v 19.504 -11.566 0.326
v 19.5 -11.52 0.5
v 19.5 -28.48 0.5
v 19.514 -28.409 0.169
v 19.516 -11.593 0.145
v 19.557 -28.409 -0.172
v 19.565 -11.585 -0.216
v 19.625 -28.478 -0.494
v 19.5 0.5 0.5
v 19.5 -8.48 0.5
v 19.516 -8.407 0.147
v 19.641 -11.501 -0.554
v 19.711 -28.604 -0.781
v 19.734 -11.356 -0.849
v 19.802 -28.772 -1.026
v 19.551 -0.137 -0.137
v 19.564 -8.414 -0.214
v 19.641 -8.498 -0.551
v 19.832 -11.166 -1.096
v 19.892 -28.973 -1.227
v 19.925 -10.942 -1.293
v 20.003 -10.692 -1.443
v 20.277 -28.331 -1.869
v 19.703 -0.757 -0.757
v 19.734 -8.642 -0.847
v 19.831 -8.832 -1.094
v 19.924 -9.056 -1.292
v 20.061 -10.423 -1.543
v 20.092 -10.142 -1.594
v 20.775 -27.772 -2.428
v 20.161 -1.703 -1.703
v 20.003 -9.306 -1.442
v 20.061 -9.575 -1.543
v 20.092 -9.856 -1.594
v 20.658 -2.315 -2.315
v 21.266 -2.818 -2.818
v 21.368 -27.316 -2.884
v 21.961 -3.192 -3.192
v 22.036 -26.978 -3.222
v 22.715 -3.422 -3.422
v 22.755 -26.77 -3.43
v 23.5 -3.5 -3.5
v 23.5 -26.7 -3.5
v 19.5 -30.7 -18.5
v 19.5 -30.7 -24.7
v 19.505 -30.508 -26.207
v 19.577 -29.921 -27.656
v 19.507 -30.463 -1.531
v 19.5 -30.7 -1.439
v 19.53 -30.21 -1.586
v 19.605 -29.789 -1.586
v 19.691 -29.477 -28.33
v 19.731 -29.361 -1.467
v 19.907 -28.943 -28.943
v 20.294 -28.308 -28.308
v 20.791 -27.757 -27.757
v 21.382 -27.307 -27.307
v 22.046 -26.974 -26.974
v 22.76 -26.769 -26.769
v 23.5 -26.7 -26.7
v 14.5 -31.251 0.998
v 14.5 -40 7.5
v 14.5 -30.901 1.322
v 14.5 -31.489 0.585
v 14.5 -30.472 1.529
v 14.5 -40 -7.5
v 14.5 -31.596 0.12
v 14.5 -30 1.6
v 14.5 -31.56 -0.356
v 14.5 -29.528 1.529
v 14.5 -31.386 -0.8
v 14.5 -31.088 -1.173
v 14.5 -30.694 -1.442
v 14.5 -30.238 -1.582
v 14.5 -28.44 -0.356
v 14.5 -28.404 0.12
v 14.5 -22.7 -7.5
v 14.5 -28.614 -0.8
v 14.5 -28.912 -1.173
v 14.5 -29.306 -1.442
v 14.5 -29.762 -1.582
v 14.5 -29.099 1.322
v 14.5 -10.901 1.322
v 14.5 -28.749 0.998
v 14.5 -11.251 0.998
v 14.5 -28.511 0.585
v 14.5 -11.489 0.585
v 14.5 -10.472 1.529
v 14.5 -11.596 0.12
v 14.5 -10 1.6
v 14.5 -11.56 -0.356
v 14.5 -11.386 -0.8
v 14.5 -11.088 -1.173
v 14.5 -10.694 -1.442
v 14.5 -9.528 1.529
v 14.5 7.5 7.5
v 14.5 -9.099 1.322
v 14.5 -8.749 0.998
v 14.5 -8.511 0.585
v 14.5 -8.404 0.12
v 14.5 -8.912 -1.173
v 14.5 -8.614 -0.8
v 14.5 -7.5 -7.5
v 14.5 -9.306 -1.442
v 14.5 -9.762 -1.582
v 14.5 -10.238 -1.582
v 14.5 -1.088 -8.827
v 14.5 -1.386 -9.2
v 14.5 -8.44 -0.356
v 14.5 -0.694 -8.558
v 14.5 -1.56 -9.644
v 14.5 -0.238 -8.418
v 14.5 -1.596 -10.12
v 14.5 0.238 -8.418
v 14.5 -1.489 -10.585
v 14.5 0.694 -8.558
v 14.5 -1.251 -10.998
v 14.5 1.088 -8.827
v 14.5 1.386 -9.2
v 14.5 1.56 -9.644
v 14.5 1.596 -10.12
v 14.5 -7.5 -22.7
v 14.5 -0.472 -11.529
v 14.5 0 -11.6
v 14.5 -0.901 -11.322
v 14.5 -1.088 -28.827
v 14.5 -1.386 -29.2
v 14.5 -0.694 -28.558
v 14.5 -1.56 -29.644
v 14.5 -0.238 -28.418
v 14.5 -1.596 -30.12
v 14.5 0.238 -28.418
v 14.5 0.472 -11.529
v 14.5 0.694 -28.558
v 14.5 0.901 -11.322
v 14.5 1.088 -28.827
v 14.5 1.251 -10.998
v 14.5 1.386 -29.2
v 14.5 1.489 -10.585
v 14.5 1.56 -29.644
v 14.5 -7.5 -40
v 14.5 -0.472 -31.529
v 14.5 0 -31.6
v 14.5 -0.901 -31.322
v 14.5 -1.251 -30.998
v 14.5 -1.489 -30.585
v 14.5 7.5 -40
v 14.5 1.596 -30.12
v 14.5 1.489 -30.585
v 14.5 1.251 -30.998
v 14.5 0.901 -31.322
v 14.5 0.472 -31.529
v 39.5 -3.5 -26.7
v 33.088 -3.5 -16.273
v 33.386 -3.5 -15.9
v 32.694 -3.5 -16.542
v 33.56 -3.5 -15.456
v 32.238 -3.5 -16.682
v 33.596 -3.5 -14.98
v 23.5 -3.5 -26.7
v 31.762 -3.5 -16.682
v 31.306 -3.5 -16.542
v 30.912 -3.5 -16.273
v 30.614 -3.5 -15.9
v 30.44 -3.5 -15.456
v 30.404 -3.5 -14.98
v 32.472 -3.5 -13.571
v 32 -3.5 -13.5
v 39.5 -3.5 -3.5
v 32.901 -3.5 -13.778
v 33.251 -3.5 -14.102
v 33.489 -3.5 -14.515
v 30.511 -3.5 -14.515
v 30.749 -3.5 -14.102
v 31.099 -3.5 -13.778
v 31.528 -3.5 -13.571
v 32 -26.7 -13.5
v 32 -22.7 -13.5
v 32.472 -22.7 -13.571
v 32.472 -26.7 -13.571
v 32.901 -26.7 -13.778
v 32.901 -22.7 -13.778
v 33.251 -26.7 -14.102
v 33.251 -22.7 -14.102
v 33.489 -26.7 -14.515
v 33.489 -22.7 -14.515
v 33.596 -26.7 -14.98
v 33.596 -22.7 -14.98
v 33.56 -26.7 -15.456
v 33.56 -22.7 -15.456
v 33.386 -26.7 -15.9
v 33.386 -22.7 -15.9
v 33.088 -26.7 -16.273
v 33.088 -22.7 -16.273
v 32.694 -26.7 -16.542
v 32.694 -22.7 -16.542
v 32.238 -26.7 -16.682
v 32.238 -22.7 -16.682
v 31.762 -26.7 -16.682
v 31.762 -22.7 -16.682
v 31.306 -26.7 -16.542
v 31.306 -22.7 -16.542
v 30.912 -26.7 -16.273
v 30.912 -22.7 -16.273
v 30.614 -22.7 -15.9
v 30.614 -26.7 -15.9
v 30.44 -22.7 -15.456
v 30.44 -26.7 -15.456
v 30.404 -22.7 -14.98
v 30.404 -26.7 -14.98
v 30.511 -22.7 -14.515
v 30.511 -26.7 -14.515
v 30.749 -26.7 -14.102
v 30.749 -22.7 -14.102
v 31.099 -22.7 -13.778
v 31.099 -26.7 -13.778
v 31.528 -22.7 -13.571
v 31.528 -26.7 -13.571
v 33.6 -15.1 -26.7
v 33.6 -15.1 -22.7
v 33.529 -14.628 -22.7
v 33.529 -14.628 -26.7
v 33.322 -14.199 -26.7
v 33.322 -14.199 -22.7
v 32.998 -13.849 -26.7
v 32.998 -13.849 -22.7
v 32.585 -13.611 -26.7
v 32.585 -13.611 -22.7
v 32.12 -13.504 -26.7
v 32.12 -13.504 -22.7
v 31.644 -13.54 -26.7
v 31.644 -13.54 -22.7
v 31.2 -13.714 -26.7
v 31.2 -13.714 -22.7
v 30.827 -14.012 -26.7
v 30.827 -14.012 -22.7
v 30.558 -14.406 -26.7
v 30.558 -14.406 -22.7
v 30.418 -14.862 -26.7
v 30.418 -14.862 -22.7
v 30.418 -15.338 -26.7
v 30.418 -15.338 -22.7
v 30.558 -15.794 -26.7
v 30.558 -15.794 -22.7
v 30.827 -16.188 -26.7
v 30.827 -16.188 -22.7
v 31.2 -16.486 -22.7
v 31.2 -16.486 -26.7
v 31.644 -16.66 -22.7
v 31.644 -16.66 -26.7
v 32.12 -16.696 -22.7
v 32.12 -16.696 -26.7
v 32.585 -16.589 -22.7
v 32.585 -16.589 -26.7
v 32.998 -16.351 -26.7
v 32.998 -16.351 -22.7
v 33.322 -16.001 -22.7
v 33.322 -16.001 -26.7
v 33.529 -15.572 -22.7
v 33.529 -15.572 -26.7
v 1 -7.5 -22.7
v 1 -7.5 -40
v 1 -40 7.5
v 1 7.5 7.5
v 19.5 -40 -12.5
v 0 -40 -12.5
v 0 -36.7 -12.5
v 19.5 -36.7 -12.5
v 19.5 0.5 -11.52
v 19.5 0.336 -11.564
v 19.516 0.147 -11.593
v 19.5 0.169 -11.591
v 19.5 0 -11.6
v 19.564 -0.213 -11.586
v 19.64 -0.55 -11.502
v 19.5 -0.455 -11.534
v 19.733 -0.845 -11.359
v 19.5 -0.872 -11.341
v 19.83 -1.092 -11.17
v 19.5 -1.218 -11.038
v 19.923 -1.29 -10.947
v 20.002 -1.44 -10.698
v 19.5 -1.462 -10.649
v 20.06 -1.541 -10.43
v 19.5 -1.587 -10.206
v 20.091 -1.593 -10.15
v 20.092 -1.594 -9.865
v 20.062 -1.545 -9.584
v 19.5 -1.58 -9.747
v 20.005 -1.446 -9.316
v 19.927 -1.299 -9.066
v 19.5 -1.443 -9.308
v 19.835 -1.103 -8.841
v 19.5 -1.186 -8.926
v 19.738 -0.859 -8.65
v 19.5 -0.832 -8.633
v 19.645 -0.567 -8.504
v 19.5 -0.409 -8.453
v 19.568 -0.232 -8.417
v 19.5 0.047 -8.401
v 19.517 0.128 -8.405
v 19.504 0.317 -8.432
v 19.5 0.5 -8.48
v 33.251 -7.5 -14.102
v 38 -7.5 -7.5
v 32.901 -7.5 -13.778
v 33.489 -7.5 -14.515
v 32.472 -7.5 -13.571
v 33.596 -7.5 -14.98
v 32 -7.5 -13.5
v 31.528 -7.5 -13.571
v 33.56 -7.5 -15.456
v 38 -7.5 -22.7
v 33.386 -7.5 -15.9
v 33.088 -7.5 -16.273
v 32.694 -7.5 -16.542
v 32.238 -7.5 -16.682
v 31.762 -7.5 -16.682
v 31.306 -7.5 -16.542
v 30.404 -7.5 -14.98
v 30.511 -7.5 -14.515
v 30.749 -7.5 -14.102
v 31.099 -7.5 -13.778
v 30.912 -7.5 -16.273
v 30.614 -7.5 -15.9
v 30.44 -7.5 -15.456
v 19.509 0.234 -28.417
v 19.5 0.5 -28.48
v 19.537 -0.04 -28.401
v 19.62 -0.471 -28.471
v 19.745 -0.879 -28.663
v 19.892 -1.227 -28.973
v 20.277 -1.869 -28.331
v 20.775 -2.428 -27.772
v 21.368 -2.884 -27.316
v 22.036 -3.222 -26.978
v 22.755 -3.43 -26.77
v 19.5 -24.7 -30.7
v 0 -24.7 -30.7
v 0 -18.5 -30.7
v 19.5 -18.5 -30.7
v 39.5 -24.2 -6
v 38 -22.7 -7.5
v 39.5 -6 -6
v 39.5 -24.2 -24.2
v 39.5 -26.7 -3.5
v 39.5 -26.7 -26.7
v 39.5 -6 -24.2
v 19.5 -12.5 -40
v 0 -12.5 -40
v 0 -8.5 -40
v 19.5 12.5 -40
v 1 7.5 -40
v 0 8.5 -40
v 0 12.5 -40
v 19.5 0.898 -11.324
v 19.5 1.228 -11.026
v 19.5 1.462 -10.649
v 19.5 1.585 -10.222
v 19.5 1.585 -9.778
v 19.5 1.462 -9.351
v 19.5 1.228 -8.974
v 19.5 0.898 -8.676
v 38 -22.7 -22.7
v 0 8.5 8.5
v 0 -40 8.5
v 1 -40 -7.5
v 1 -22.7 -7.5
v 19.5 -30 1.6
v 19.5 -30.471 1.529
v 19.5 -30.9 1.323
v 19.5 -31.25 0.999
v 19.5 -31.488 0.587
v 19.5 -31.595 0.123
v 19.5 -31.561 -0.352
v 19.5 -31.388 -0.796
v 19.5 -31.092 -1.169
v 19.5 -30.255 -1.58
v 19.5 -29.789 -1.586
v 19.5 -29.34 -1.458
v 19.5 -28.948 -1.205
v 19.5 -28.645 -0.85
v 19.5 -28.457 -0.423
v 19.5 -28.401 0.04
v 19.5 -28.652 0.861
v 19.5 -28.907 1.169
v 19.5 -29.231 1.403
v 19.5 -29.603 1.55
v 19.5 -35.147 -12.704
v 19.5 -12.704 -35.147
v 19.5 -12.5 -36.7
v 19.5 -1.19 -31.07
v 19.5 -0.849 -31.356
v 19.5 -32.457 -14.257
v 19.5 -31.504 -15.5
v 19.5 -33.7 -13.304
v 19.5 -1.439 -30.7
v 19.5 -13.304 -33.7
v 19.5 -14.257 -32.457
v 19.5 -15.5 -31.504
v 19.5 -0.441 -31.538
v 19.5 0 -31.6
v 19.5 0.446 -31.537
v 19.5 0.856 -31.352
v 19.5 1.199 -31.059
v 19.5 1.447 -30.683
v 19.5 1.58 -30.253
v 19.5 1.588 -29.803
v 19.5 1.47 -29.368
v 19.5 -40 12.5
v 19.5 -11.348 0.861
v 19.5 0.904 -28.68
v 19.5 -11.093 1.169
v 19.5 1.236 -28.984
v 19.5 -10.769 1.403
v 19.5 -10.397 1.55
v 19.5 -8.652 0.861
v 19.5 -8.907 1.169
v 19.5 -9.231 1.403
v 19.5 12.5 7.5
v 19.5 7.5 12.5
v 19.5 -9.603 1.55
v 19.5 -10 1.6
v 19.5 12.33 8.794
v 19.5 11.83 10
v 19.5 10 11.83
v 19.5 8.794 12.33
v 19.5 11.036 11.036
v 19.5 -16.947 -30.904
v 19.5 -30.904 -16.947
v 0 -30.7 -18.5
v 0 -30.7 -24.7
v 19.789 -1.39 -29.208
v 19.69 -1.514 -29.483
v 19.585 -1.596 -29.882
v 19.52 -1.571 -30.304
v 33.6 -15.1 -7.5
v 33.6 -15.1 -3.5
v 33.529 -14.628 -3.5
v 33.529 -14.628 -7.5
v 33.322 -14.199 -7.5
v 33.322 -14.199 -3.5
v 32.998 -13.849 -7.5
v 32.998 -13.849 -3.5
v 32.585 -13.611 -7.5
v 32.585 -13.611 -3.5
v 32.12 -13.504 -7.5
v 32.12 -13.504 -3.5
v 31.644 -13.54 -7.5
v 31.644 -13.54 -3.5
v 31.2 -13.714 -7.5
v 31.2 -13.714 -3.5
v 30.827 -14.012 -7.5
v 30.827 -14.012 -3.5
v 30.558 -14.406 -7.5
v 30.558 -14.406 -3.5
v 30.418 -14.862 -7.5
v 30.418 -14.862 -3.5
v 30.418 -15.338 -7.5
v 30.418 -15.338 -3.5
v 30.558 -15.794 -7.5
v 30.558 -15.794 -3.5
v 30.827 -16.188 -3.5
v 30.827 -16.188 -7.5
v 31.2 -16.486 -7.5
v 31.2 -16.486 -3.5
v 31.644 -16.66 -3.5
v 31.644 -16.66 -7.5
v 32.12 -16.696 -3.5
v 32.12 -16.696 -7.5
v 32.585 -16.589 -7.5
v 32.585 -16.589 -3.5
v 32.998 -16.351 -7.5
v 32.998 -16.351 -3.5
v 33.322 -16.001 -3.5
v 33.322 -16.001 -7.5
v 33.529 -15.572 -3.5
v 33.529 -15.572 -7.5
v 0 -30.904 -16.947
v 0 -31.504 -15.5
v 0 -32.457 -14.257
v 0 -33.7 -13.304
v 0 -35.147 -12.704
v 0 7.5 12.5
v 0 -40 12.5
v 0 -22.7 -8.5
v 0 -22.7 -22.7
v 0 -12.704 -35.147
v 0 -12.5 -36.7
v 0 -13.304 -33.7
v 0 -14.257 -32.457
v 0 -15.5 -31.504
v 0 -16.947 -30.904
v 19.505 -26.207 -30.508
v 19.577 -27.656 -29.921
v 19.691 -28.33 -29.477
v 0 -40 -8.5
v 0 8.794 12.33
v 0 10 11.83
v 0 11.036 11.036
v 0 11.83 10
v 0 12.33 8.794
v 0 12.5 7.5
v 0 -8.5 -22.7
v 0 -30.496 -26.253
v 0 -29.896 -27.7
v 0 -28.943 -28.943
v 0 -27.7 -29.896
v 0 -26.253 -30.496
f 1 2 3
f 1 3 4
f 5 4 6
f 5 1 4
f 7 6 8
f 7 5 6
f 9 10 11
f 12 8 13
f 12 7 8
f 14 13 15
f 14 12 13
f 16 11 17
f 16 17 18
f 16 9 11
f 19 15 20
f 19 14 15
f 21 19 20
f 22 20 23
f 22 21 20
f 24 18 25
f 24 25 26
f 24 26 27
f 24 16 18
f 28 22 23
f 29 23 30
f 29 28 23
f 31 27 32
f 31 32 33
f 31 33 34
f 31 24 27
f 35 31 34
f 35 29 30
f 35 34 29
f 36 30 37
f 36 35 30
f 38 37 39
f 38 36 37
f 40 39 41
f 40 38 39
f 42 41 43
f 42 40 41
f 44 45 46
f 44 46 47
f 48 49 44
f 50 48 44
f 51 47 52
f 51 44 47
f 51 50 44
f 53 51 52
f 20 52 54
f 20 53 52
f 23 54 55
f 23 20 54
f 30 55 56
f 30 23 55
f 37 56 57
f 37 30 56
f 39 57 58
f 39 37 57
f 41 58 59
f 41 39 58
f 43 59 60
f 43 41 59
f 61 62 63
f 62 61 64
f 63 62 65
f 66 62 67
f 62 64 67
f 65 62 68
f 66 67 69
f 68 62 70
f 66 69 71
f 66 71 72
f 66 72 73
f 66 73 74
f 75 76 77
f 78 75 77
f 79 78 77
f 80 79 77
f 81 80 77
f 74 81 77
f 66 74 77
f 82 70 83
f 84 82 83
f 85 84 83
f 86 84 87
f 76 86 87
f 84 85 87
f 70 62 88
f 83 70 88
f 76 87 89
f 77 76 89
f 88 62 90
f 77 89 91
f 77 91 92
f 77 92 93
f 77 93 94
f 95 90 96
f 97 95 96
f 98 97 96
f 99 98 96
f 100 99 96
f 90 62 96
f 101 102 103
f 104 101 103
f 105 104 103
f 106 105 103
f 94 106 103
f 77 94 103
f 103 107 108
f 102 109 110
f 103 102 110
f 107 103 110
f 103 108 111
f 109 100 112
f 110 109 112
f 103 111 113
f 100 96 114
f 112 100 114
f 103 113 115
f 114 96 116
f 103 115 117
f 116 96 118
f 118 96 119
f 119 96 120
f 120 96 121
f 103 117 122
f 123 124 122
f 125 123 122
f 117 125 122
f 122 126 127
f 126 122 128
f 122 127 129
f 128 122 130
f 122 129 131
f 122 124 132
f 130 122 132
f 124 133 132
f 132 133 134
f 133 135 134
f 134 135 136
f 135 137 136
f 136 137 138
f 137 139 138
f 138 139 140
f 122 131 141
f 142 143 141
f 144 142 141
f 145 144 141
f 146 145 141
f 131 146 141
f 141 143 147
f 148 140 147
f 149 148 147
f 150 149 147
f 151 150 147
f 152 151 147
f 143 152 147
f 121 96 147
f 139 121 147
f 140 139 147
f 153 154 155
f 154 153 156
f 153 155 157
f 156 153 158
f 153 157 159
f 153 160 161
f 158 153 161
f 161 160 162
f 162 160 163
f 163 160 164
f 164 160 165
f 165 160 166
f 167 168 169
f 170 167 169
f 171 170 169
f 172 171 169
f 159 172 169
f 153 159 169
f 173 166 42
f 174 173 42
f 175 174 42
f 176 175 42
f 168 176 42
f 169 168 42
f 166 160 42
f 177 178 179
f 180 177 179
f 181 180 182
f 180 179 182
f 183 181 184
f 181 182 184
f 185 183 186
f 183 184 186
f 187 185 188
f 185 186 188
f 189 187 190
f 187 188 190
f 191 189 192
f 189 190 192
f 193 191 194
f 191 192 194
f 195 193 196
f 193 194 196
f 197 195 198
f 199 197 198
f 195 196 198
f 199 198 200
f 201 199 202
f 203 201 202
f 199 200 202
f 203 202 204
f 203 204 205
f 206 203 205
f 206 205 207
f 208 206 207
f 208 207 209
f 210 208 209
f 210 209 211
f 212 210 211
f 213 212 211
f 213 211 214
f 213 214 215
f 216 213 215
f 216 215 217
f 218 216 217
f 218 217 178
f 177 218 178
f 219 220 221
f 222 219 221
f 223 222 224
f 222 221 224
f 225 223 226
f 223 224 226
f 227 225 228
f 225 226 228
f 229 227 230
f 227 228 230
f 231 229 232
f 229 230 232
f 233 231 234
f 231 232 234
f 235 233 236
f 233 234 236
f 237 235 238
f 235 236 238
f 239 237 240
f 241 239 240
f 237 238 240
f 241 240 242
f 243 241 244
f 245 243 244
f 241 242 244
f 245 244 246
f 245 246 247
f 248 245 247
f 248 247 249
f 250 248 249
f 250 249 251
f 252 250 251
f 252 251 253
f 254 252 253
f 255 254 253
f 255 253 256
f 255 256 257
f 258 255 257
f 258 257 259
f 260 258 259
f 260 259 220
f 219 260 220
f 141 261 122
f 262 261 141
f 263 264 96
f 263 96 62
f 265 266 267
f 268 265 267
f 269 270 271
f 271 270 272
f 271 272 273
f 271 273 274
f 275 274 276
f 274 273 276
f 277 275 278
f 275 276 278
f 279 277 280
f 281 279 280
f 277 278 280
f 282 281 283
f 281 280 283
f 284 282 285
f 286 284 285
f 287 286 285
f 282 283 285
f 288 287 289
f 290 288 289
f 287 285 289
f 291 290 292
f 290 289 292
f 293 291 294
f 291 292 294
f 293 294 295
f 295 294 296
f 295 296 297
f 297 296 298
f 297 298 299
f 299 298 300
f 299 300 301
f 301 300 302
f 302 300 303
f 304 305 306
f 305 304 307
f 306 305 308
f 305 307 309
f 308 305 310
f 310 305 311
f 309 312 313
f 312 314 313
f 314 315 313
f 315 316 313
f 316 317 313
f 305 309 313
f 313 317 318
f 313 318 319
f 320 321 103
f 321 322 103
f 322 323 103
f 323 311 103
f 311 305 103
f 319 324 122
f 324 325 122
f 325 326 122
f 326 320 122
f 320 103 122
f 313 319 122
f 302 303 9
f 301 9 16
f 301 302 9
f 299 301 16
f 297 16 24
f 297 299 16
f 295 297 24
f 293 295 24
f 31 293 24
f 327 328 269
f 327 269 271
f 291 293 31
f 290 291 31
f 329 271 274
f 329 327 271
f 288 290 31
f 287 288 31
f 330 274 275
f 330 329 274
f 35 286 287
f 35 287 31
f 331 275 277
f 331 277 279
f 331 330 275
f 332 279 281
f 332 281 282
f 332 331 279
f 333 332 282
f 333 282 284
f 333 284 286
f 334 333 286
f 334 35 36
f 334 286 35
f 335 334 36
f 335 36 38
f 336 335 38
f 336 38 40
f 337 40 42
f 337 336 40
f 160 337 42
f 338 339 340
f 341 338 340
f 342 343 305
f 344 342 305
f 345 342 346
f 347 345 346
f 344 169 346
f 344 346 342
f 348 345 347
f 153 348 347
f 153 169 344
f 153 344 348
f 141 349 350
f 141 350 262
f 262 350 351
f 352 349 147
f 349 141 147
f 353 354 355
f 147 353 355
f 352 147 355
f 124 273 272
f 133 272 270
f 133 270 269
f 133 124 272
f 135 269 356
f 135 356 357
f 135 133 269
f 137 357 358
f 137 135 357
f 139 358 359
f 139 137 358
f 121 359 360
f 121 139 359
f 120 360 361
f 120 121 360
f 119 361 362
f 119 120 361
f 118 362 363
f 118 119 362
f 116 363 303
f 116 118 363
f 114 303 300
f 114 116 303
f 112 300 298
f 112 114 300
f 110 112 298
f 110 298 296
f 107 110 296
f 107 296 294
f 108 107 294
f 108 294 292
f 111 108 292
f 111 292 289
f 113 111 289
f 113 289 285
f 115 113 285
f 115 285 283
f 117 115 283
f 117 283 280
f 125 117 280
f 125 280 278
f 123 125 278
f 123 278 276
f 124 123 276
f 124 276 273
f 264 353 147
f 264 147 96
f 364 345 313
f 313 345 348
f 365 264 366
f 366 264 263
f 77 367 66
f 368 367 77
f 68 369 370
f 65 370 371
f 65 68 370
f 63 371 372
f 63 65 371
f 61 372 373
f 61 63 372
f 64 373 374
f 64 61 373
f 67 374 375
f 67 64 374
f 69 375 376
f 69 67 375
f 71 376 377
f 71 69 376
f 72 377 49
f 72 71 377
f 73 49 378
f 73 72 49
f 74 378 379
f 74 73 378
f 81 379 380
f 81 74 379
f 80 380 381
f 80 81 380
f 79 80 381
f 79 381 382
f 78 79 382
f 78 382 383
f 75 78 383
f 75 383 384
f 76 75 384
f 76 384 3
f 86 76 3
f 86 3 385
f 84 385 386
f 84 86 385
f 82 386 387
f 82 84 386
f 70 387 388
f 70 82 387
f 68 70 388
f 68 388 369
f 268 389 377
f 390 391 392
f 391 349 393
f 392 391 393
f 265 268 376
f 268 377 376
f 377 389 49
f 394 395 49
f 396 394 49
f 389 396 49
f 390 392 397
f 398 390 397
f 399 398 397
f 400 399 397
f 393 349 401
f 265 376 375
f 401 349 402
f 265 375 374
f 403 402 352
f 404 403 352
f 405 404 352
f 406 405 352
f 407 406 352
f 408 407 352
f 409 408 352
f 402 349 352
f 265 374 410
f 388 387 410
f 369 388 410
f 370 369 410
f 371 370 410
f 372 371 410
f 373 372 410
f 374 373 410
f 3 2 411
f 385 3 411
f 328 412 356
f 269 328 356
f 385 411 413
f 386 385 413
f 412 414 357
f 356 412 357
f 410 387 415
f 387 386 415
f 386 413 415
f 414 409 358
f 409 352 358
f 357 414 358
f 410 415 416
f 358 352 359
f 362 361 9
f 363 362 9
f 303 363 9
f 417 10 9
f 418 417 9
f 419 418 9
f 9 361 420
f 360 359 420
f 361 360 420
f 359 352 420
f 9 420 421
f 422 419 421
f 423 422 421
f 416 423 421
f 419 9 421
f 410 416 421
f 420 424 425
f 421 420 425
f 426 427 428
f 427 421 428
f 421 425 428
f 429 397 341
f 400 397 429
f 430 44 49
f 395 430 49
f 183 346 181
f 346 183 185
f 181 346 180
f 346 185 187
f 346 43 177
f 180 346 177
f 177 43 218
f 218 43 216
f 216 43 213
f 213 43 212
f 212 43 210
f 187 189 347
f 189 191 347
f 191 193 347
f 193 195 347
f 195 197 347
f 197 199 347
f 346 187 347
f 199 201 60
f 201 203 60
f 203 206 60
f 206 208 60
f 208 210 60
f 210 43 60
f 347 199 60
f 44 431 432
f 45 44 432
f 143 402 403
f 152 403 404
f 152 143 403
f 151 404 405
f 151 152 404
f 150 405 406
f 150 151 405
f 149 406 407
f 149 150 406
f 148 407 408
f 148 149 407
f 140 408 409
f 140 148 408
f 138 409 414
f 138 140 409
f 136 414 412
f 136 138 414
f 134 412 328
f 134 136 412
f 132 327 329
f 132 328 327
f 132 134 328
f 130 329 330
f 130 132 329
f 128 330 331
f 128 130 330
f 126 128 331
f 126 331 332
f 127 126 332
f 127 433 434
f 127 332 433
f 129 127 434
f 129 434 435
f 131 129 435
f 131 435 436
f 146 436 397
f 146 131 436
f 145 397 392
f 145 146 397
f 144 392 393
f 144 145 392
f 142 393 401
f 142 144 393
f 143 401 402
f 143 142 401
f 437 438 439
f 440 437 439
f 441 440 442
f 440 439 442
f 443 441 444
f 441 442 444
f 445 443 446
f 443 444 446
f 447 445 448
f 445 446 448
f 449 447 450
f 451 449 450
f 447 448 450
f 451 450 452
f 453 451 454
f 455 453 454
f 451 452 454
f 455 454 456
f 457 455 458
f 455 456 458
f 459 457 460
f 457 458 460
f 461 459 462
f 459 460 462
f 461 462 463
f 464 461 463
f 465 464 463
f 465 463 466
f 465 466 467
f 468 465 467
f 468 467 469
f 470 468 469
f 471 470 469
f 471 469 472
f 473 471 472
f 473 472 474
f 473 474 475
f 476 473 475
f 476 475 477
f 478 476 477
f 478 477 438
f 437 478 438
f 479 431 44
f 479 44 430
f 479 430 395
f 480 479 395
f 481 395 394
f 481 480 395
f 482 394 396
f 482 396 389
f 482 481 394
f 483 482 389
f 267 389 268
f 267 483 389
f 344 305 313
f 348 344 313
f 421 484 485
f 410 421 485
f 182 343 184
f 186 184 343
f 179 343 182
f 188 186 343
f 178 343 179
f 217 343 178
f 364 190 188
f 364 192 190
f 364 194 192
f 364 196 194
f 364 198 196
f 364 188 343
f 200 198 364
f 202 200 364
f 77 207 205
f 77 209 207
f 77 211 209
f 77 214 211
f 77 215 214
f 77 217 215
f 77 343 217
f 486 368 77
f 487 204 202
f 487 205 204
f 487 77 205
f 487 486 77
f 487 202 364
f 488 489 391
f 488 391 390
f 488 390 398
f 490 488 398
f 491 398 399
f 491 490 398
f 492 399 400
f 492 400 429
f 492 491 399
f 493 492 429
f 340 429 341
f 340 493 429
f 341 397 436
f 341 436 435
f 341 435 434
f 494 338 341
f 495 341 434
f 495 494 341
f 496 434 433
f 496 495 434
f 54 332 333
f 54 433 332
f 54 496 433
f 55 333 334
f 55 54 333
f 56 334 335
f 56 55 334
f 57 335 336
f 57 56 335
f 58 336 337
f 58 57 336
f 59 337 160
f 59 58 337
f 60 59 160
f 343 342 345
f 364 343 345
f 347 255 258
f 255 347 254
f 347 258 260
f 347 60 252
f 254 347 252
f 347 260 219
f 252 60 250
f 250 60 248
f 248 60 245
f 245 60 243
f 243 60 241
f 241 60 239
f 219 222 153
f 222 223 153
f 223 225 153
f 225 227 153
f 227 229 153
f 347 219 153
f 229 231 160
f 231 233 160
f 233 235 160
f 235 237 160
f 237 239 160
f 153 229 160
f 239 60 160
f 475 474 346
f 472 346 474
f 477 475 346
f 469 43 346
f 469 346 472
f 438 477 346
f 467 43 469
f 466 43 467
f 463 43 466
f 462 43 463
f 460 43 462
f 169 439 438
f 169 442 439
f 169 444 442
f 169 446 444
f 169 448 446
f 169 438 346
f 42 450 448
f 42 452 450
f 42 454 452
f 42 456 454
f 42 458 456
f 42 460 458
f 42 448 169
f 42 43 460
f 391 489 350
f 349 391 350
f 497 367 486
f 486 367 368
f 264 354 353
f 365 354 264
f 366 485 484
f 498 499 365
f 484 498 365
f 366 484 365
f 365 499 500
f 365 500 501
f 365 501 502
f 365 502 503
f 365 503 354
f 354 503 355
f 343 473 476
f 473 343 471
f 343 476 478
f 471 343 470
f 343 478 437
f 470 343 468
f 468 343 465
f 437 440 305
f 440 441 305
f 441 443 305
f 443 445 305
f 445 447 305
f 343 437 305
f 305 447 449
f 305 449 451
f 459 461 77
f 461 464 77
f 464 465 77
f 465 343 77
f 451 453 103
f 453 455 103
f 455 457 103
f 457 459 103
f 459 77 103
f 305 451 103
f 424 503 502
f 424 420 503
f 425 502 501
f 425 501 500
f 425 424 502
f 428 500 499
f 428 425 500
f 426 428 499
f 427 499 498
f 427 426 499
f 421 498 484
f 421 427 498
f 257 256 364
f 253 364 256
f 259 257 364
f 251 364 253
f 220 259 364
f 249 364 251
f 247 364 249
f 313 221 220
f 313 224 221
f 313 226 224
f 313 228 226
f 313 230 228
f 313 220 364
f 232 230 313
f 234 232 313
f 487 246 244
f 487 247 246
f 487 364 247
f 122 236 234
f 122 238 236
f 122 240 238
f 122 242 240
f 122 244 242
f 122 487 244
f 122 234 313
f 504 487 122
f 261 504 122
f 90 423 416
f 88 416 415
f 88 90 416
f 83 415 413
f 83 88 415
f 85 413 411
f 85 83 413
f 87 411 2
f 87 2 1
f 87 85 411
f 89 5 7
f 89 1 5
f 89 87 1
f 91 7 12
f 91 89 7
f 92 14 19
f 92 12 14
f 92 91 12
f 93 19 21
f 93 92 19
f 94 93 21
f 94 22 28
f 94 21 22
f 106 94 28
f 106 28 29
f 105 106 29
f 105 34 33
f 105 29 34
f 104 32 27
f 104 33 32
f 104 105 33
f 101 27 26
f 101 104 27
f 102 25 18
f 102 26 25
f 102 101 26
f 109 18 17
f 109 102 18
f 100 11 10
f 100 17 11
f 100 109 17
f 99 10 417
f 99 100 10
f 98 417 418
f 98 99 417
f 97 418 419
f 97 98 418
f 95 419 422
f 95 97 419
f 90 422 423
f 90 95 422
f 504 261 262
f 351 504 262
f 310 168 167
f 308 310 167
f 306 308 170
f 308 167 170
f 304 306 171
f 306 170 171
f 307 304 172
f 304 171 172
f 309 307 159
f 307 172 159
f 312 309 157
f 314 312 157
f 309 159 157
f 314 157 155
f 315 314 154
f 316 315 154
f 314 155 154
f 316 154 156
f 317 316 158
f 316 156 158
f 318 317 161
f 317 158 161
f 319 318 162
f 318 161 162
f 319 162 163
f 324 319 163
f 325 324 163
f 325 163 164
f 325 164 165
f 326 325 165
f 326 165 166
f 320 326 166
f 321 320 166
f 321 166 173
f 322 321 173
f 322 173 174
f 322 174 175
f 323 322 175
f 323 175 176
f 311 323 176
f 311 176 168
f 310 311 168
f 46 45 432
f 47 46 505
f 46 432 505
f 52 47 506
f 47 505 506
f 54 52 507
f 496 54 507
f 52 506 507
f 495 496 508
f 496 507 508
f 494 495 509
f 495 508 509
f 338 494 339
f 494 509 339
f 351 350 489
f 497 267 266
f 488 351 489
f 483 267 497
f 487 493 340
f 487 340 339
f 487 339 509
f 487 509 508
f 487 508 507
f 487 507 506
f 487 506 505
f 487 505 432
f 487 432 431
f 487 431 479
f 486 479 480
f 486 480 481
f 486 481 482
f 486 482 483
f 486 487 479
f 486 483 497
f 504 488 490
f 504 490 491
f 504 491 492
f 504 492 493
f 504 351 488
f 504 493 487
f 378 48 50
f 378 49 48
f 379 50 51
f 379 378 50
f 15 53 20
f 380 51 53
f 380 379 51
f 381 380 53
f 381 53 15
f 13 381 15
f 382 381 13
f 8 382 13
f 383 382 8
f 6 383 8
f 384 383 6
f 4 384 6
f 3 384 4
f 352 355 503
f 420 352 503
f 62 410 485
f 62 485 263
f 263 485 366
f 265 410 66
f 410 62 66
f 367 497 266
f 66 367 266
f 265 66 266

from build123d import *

# Parameters (mm, degrees)
SKETCH_1_R          = 1.6
SKETCH_1_W          = 15.2
SKETCH_1_H          = 15.2
EXTRUDE_1_DEPTH     = 19.5
CUT_EXTRUDE_1_DEPTH = 14.5
SKETCH_3_W          = 23.2
SKETCH_3_H          = 23.2
SKETCH_3_W_2        = 15.2
SKETCH_3_H_2        = 15.2
EXTRUDE_2_DEPTH     = 20
FILLET_1_R          = 4
FILLET_2_R          = 6
CHAMFER_1_SIZE      = 1.5
CHAMFER_2_SIZE      = 1
SKETCH_4_R          = 1.6
CUT_EXTRUDE_2_DEPTH = 68.026114314
SKETCH_5_R          = 1.6
CUT_EXTRUDE_3_DEPTH = 68.026114314
FILLET_3_R          = 5


with BuildPart() as part:
    # 草图1 → 凸台-拉伸1 (new body)
    with BuildSketch(Plane(origin=(0, 0, 0), x_dir=(0, 0, -1), z_dir=(1, 0, 0))):
        Polygon((12.5, -30.7), (30.7, -30.7), (30.7, -12.5), (40, -12.5), (40, 12.5), (-12.5, 12.5), (-12.5, -40), (12.5, -40), align=None)
        with Locations((10, 0)):
            Circle(SKETCH_1_R, mode=Mode.SUBTRACT)
        with Locations((30, 0)):
            Circle(SKETCH_1_R, mode=Mode.SUBTRACT)
        with Locations(Location((0, -30, 0), (0, 0, 180))):
            Circle(SKETCH_1_R, mode=Mode.SUBTRACT)
        with Locations(Location((0, -10, 0), (0, 0, 180))):
            Circle(SKETCH_1_R, mode=Mode.SUBTRACT)
        with Locations((15.1, -15.1)):
            Rectangle(SKETCH_1_W, SKETCH_1_H, mode=Mode.SUBTRACT)
    extrude(amount=EXTRUDE_1_DEPTH)

    # 草图2 → 切除-拉伸1 (cut)
    with BuildSketch(Plane.ZY):
        Polygon((7.5, 7.5), (7.5, -40), (-7.5, -40), (-7.5, -7.5), (-40, -7.5), (-40, 7.5), align=None)
    extrude(amount=-CUT_EXTRUDE_1_DEPTH, mode=Mode.SUBTRACT)

    # 草图3 → 凸台-拉伸2 (add)
    with BuildSketch(Plane(origin=(19.5, 0, 0), x_dir=(0, 0, -1), z_dir=(1, 0, 0))):
        with Locations((15.1, -15.1)):
            Rectangle(SKETCH_3_W, SKETCH_3_H)
        with Locations((15.1, -15.1)):
            Rectangle(SKETCH_3_W_2, SKETCH_3_H_2, mode=Mode.SUBTRACT)
    extrude(amount=EXTRUDE_2_DEPTH)

    # 圆角1
    # the kernel refuses this fillet: 4 mm, written as the material it adds along each edge
    with BuildSketch(Plane(origin=(19.5, -3.5, -3.5), x_dir=(0, 0, 1), z_dir=(0, -1, 0))) as fillet_1_piece_1_section:
        with BuildLine():
            CenterArc((FILLET_1_R, -FILLET_1_R), FILLET_1_R, 90, 90)
            Line((0, -FILLET_1_R), (0, 0))
            Line((0, 0), (FILLET_1_R, 0))
        make_face()
    fillet_1_piece_1 = extrude(amount=23.2, mode=Mode.PRIVATE)
    fillet_1_piece_1 = fillet_1_piece_1 - Plane(origin=(20.41689995, -10, 0), x_dir=(0, 0, 1), z_dir=(-1, 0, 0)) * Cylinder(1.6, 63, mode=Mode.PRIVATE)
    add(fillet_1_piece_1)
    with BuildSketch(Plane(origin=(19.5, -26.7, -3.5), x_dir=(0, -1, 0), z_dir=(0, 0, -1)), Plane(origin=(19.5, -26.7, -26.7), x_dir=(0, 0, -1), z_dir=(0, 1, 0))) as fillet_1_piece_2:
        with BuildLine():
            CenterArc((FILLET_1_R, -FILLET_1_R), FILLET_1_R, 90, 90)
            Line((0, -FILLET_1_R), (0, 0))
            Line((0, 0), (FILLET_1_R, 0))
        make_face()
    extrude(amount=23.2)
    with BuildSketch(Plane(origin=(19.5, -3.5, -26.7), x_dir=(0, 1, 0), z_dir=(0, 0, 1))) as fillet_1_piece_3_section:
        with BuildLine():
            CenterArc((FILLET_1_R, -FILLET_1_R), FILLET_1_R, 90, 90)
            Line((0, -FILLET_1_R), (0, 0))
            Line((0, 0), (FILLET_1_R, 0))
        make_face()
    fillet_1_piece_3 = extrude(amount=23.2, mode=Mode.PRIVATE)
    fillet_1_piece_3 = fillet_1_piece_3 - Plane(origin=(20.416900014, 0, -10), x_dir=(0, 0, -1), z_dir=(-1, 0, 0)) * Cylinder(1.6, 63, mode=Mode.PRIVATE)
    add(fillet_1_piece_3)
    with BuildSketch(Plane(origin=(19.5, -3.5, -26.7), x_dir=(0, 1, 0), z_dir=(0, 0, 1))) as fillet_1_piece_4a_section:
        with BuildLine():
            CenterArc((FILLET_1_R, -FILLET_1_R), FILLET_1_R, 90, 90)
            Line((0, -FILLET_1_R), (0, 0))
            Line((0, 0), (FILLET_1_R, 0))
        make_face()
    fillet_1_piece_4a = extrude(amount=33.2, mode=Mode.PRIVATE)
    fillet_1_piece_4a = split(fillet_1_piece_4a, bisect_by=Plane(origin=(20.405580457, -2.594419543, -3.5), z_dir=(0, 0, 1)), keep=Keep.TOP, mode=Mode.PRIVATE)
    with BuildSketch(Plane(origin=(19.5, 6.5, -3.5), x_dir=(0, 0, 1), z_dir=(0, -1, 0))) as fillet_1_piece_4b_section:
        with BuildLine():
            CenterArc((FILLET_1_R, -FILLET_1_R), FILLET_1_R, 90, 90)
            Line((0, -FILLET_1_R), (0, 0))
            Line((0, 0), (FILLET_1_R, 0))
        make_face()
    fillet_1_piece_4b = extrude(amount=33.2, mode=Mode.PRIVATE)
    fillet_1_piece_4b = split(fillet_1_piece_4b, bisect_by=Plane(origin=(20.405580457, -3.5, -2.594419543), z_dir=(0, 1, 0)), keep=Keep.TOP, mode=Mode.PRIVATE)
    fillet_1_piece_4 = fillet_1_piece_4a & fillet_1_piece_4b
    add(fillet_1_piece_4)
    with BuildSketch(Plane(origin=(19.5, -26.7, 6.5), x_dir=(0, -1, 0), z_dir=(0, 0, -1))) as fillet_1_piece_5a_section:
        with BuildLine():
            CenterArc((FILLET_1_R, -FILLET_1_R), FILLET_1_R, 90, 90)
            Line((0, -FILLET_1_R), (0, 0))
            Line((0, 0), (FILLET_1_R, 0))
        make_face()
    fillet_1_piece_5a = extrude(amount=33.2, mode=Mode.PRIVATE)
    fillet_1_piece_5a = fillet_1_piece_5a - Plane(origin=(20.438690709, -30, 0), x_dir=(0, 0, 1), z_dir=(-1, 0, 0)) * Cylinder(1.6, 83, mode=Mode.PRIVATE)
    fillet_1_piece_5a = split(fillet_1_piece_5a, bisect_by=Plane(origin=(20.438690709, -27.535460333, -3.5), z_dir=(0, 0, 1)), keep=Keep.TOP, mode=Mode.PRIVATE)
    with BuildSketch(Plane(origin=(19.5, -3.5, -3.5), x_dir=(0, 0, 1), z_dir=(0, -1, 0))) as fillet_1_piece_5b_section:
        with BuildLine():
            CenterArc((FILLET_1_R, -FILLET_1_R), FILLET_1_R, 90, 90)
            Line((0, -FILLET_1_R), (0, 0))
            Line((0, 0), (FILLET_1_R, 0))
        make_face()
    fillet_1_piece_5b = extrude(amount=33.2, mode=Mode.PRIVATE)
    fillet_1_piece_5b = fillet_1_piece_5b - Plane(origin=(20.432327139, -30, 0), x_dir=(0, 0, 1), z_dir=(-1, 0, 0)) * Cylinder(1.6, 83, mode=Mode.PRIVATE)
    fillet_1_piece_5b = split(fillet_1_piece_5b, bisect_by=Plane(origin=(20.432327139, -26.7, -2.653974982), z_dir=(0, -1, 0)), keep=Keep.TOP, mode=Mode.PRIVATE)
    fillet_1_piece_5 = fillet_1_piece_5a & fillet_1_piece_5b
    add(fillet_1_piece_5)
    with BuildSketch(Plane(origin=(19.5, -26.7, -3.5), x_dir=(0, -1, 0), z_dir=(0, 0, -1))) as fillet_1_piece_6a_section:
        with BuildLine():
            CenterArc((FILLET_1_R, -FILLET_1_R), FILLET_1_R, 90, 90)
            Line((0, -FILLET_1_R), (0, 0))
            Line((0, 0), (FILLET_1_R, 0))
        make_face()
    fillet_1_piece_6a = extrude(amount=33.2, mode=Mode.PRIVATE)
    fillet_1_piece_6a = split(fillet_1_piece_6a, bisect_by=Plane(origin=(20.405580457, -27.605580457, -30.7), z_dir=(0, 0, 1)), keep=Keep.TOP, mode=Mode.PRIVATE)
    fillet_1_piece_6a = split(fillet_1_piece_6a, bisect_by=Plane(origin=(20.405580457, -27.605580457, -26.7), z_dir=(0, 0, -1)), keep=Keep.TOP, mode=Mode.PRIVATE)
    with BuildSketch(Plane(origin=(19.5, -36.7, -26.7), x_dir=(0, 0, -1), z_dir=(0, 1, 0))) as fillet_1_piece_6b_section:
        with BuildLine():
            CenterArc((FILLET_1_R, -FILLET_1_R), FILLET_1_R, 90, 90)
            Line((0, -FILLET_1_R), (0, 0))
            Line((0, 0), (FILLET_1_R, 0))
        make_face()
    fillet_1_piece_6b = extrude(amount=33.2, mode=Mode.PRIVATE)
    fillet_1_piece_6b = split(fillet_1_piece_6b, bisect_by=Plane(origin=(20.405580457, -30.7, -27.605580457), z_dir=(0, 1, 0)), keep=Keep.TOP, mode=Mode.PRIVATE)
    fillet_1_piece_6b = split(fillet_1_piece_6b, bisect_by=Plane(origin=(20.405580457, -26.7, -27.605580457), z_dir=(0, -1, 0)), keep=Keep.TOP, mode=Mode.PRIVATE)
    fillet_1_piece_6 = fillet_1_piece_6a & fillet_1_piece_6b
    add(fillet_1_piece_6)
    with BuildSketch(Plane(origin=(19.5, -26.7, -26.7), x_dir=(0, 0, -1), z_dir=(0, 1, 0))) as fillet_1_piece_7a_section:
        with BuildLine():
            CenterArc((FILLET_1_R, -FILLET_1_R), FILLET_1_R, 90, 90)
            Line((0, -FILLET_1_R), (0, 0))
            Line((0, 0), (FILLET_1_R, 0))
        make_face()
    fillet_1_piece_7a = extrude(amount=33.2, mode=Mode.PRIVATE)
    fillet_1_piece_7a = fillet_1_piece_7a - Plane(origin=(20.438690575, 0, -30), x_dir=(0, 0, -1), z_dir=(-1, 0, 0)) * Cylinder(1.6, 83, mode=Mode.PRIVATE)
    fillet_1_piece_7a = split(fillet_1_piece_7a, bisect_by=Plane(origin=(20.438690575, -3.5, -27.535460712), z_dir=(0, 1, 0)), keep=Keep.TOP, mode=Mode.PRIVATE)
    with BuildSketch(Plane(origin=(19.5, -3.5, -36.7), x_dir=(0, 1, 0), z_dir=(0, 0, 1))) as fillet_1_piece_7b_section:
        with BuildLine():
            CenterArc((FILLET_1_R, -FILLET_1_R), FILLET_1_R, 90, 90)
            Line((0, -FILLET_1_R), (0, 0))
            Line((0, 0), (FILLET_1_R, 0))
        make_face()
    fillet_1_piece_7b = extrude(amount=33.2, mode=Mode.PRIVATE)
    fillet_1_piece_7b = fillet_1_piece_7b - Plane(origin=(20.432327238, 0, -30), x_dir=(0, 0, -1), z_dir=(-1, 0, 0)) * Cylinder(1.6, 83, mode=Mode.PRIVATE)
    fillet_1_piece_7b = split(fillet_1_piece_7b, bisect_by=Plane(origin=(20.432327238, -2.653975394, -26.7), z_dir=(0, 0, -1)), keep=Keep.TOP, mode=Mode.PRIVATE)
    fillet_1_piece_7 = fillet_1_piece_7a & fillet_1_piece_7b
    add(fillet_1_piece_7)

    # 圆角2
    # the kernel refuses this fillet: 6 mm, written as the material it adds along each edge
    with BuildSketch(Plane(origin=(0, -30.7, -12.5), x_dir=(0, 0, -1), z_dir=(1, 0, 0)), Plane(origin=(0, -12.5, -30.7), x_dir=(0, 0, -1), z_dir=(1, 0, 0))) as fillet_2_piece_1:
        with BuildLine():
            CenterArc((FILLET_2_R, -FILLET_2_R), FILLET_2_R, 90, 90)
            Line((0, -FILLET_2_R), (0, 0))
            Line((0, 0), (FILLET_2_R, 0))
        make_face()
    extrude(amount=19.5)
    # the kernel refuses this fillet: 6 mm, written as the material it takes off along each edge
    with BuildSketch(Plane(origin=(-15, -30.7, -30.7), x_dir=(0, 0, 1), z_dir=(1, 0, 0))) as fillet_2_2_piece_1:
        with BuildLine():
            CenterArc((FILLET_2_R, -FILLET_2_R), FILLET_2_R, 90, 90)
            Line((0, -FILLET_2_R), (0, 0))
            Line((0, 0), (FILLET_2_R, 0))
        make_face()
    extrude(amount=49.5, mode=Mode.SUBTRACT)

    # 倒角1
    chamfer_1_edges = [part.edges().sort_by_distance(p)[0] for p in [
        (39.5, -15.1, -7.5),
        (39.5, -22.7, -15.1),
        (39.5, -15.1, -22.7),
        (39.5, -7.5, -15.1),
    ]]
    chamfer(chamfer_1_edges, length=CHAMFER_1_SIZE)

    # 倒角2
    chamfer_2_edges = [part.edges().sort_by_distance(p)[0] for p in [
        (0, 7.5, -16.25),
        (0, -7.5, -31.35),
        (0, -31.35, -7.5),
        (0, -16.25, 7.5),
    ]]
    chamfer(chamfer_2_edges, length=CHAMFER_2_SIZE)

    # 草图4 → 切除-拉伸2 (cut, through all)
    with BuildSketch(Plane.XY.offset(-3.5)):
        with Locations((32, -15.1)):
            Circle(SKETCH_4_R)
    extrude(amount=-CUT_EXTRUDE_2_DEPTH, mode=Mode.SUBTRACT)

    # 草图5 → 切除-拉伸3 (cut, through all)
    with BuildSketch(Plane(origin=(0, -3.5, 0), x_dir=(1, 0, 0), z_dir=(0, 1, 0))):
        with Locations(Location((32, 15.1, 0), (0, 0, 270))):
            Circle(SKETCH_5_R)
    extrude(amount=-CUT_EXTRUDE_3_DEPTH, mode=Mode.SUBTRACT)

    # 圆角3
    fillet_3_edges = [part.edges().sort_by_distance(p)[0] for p in [
        (9.75, 12.5, 12.5),
    ]]
    fillet(fillet_3_edges, radius=FILLET_3_R)


solid = part.part
